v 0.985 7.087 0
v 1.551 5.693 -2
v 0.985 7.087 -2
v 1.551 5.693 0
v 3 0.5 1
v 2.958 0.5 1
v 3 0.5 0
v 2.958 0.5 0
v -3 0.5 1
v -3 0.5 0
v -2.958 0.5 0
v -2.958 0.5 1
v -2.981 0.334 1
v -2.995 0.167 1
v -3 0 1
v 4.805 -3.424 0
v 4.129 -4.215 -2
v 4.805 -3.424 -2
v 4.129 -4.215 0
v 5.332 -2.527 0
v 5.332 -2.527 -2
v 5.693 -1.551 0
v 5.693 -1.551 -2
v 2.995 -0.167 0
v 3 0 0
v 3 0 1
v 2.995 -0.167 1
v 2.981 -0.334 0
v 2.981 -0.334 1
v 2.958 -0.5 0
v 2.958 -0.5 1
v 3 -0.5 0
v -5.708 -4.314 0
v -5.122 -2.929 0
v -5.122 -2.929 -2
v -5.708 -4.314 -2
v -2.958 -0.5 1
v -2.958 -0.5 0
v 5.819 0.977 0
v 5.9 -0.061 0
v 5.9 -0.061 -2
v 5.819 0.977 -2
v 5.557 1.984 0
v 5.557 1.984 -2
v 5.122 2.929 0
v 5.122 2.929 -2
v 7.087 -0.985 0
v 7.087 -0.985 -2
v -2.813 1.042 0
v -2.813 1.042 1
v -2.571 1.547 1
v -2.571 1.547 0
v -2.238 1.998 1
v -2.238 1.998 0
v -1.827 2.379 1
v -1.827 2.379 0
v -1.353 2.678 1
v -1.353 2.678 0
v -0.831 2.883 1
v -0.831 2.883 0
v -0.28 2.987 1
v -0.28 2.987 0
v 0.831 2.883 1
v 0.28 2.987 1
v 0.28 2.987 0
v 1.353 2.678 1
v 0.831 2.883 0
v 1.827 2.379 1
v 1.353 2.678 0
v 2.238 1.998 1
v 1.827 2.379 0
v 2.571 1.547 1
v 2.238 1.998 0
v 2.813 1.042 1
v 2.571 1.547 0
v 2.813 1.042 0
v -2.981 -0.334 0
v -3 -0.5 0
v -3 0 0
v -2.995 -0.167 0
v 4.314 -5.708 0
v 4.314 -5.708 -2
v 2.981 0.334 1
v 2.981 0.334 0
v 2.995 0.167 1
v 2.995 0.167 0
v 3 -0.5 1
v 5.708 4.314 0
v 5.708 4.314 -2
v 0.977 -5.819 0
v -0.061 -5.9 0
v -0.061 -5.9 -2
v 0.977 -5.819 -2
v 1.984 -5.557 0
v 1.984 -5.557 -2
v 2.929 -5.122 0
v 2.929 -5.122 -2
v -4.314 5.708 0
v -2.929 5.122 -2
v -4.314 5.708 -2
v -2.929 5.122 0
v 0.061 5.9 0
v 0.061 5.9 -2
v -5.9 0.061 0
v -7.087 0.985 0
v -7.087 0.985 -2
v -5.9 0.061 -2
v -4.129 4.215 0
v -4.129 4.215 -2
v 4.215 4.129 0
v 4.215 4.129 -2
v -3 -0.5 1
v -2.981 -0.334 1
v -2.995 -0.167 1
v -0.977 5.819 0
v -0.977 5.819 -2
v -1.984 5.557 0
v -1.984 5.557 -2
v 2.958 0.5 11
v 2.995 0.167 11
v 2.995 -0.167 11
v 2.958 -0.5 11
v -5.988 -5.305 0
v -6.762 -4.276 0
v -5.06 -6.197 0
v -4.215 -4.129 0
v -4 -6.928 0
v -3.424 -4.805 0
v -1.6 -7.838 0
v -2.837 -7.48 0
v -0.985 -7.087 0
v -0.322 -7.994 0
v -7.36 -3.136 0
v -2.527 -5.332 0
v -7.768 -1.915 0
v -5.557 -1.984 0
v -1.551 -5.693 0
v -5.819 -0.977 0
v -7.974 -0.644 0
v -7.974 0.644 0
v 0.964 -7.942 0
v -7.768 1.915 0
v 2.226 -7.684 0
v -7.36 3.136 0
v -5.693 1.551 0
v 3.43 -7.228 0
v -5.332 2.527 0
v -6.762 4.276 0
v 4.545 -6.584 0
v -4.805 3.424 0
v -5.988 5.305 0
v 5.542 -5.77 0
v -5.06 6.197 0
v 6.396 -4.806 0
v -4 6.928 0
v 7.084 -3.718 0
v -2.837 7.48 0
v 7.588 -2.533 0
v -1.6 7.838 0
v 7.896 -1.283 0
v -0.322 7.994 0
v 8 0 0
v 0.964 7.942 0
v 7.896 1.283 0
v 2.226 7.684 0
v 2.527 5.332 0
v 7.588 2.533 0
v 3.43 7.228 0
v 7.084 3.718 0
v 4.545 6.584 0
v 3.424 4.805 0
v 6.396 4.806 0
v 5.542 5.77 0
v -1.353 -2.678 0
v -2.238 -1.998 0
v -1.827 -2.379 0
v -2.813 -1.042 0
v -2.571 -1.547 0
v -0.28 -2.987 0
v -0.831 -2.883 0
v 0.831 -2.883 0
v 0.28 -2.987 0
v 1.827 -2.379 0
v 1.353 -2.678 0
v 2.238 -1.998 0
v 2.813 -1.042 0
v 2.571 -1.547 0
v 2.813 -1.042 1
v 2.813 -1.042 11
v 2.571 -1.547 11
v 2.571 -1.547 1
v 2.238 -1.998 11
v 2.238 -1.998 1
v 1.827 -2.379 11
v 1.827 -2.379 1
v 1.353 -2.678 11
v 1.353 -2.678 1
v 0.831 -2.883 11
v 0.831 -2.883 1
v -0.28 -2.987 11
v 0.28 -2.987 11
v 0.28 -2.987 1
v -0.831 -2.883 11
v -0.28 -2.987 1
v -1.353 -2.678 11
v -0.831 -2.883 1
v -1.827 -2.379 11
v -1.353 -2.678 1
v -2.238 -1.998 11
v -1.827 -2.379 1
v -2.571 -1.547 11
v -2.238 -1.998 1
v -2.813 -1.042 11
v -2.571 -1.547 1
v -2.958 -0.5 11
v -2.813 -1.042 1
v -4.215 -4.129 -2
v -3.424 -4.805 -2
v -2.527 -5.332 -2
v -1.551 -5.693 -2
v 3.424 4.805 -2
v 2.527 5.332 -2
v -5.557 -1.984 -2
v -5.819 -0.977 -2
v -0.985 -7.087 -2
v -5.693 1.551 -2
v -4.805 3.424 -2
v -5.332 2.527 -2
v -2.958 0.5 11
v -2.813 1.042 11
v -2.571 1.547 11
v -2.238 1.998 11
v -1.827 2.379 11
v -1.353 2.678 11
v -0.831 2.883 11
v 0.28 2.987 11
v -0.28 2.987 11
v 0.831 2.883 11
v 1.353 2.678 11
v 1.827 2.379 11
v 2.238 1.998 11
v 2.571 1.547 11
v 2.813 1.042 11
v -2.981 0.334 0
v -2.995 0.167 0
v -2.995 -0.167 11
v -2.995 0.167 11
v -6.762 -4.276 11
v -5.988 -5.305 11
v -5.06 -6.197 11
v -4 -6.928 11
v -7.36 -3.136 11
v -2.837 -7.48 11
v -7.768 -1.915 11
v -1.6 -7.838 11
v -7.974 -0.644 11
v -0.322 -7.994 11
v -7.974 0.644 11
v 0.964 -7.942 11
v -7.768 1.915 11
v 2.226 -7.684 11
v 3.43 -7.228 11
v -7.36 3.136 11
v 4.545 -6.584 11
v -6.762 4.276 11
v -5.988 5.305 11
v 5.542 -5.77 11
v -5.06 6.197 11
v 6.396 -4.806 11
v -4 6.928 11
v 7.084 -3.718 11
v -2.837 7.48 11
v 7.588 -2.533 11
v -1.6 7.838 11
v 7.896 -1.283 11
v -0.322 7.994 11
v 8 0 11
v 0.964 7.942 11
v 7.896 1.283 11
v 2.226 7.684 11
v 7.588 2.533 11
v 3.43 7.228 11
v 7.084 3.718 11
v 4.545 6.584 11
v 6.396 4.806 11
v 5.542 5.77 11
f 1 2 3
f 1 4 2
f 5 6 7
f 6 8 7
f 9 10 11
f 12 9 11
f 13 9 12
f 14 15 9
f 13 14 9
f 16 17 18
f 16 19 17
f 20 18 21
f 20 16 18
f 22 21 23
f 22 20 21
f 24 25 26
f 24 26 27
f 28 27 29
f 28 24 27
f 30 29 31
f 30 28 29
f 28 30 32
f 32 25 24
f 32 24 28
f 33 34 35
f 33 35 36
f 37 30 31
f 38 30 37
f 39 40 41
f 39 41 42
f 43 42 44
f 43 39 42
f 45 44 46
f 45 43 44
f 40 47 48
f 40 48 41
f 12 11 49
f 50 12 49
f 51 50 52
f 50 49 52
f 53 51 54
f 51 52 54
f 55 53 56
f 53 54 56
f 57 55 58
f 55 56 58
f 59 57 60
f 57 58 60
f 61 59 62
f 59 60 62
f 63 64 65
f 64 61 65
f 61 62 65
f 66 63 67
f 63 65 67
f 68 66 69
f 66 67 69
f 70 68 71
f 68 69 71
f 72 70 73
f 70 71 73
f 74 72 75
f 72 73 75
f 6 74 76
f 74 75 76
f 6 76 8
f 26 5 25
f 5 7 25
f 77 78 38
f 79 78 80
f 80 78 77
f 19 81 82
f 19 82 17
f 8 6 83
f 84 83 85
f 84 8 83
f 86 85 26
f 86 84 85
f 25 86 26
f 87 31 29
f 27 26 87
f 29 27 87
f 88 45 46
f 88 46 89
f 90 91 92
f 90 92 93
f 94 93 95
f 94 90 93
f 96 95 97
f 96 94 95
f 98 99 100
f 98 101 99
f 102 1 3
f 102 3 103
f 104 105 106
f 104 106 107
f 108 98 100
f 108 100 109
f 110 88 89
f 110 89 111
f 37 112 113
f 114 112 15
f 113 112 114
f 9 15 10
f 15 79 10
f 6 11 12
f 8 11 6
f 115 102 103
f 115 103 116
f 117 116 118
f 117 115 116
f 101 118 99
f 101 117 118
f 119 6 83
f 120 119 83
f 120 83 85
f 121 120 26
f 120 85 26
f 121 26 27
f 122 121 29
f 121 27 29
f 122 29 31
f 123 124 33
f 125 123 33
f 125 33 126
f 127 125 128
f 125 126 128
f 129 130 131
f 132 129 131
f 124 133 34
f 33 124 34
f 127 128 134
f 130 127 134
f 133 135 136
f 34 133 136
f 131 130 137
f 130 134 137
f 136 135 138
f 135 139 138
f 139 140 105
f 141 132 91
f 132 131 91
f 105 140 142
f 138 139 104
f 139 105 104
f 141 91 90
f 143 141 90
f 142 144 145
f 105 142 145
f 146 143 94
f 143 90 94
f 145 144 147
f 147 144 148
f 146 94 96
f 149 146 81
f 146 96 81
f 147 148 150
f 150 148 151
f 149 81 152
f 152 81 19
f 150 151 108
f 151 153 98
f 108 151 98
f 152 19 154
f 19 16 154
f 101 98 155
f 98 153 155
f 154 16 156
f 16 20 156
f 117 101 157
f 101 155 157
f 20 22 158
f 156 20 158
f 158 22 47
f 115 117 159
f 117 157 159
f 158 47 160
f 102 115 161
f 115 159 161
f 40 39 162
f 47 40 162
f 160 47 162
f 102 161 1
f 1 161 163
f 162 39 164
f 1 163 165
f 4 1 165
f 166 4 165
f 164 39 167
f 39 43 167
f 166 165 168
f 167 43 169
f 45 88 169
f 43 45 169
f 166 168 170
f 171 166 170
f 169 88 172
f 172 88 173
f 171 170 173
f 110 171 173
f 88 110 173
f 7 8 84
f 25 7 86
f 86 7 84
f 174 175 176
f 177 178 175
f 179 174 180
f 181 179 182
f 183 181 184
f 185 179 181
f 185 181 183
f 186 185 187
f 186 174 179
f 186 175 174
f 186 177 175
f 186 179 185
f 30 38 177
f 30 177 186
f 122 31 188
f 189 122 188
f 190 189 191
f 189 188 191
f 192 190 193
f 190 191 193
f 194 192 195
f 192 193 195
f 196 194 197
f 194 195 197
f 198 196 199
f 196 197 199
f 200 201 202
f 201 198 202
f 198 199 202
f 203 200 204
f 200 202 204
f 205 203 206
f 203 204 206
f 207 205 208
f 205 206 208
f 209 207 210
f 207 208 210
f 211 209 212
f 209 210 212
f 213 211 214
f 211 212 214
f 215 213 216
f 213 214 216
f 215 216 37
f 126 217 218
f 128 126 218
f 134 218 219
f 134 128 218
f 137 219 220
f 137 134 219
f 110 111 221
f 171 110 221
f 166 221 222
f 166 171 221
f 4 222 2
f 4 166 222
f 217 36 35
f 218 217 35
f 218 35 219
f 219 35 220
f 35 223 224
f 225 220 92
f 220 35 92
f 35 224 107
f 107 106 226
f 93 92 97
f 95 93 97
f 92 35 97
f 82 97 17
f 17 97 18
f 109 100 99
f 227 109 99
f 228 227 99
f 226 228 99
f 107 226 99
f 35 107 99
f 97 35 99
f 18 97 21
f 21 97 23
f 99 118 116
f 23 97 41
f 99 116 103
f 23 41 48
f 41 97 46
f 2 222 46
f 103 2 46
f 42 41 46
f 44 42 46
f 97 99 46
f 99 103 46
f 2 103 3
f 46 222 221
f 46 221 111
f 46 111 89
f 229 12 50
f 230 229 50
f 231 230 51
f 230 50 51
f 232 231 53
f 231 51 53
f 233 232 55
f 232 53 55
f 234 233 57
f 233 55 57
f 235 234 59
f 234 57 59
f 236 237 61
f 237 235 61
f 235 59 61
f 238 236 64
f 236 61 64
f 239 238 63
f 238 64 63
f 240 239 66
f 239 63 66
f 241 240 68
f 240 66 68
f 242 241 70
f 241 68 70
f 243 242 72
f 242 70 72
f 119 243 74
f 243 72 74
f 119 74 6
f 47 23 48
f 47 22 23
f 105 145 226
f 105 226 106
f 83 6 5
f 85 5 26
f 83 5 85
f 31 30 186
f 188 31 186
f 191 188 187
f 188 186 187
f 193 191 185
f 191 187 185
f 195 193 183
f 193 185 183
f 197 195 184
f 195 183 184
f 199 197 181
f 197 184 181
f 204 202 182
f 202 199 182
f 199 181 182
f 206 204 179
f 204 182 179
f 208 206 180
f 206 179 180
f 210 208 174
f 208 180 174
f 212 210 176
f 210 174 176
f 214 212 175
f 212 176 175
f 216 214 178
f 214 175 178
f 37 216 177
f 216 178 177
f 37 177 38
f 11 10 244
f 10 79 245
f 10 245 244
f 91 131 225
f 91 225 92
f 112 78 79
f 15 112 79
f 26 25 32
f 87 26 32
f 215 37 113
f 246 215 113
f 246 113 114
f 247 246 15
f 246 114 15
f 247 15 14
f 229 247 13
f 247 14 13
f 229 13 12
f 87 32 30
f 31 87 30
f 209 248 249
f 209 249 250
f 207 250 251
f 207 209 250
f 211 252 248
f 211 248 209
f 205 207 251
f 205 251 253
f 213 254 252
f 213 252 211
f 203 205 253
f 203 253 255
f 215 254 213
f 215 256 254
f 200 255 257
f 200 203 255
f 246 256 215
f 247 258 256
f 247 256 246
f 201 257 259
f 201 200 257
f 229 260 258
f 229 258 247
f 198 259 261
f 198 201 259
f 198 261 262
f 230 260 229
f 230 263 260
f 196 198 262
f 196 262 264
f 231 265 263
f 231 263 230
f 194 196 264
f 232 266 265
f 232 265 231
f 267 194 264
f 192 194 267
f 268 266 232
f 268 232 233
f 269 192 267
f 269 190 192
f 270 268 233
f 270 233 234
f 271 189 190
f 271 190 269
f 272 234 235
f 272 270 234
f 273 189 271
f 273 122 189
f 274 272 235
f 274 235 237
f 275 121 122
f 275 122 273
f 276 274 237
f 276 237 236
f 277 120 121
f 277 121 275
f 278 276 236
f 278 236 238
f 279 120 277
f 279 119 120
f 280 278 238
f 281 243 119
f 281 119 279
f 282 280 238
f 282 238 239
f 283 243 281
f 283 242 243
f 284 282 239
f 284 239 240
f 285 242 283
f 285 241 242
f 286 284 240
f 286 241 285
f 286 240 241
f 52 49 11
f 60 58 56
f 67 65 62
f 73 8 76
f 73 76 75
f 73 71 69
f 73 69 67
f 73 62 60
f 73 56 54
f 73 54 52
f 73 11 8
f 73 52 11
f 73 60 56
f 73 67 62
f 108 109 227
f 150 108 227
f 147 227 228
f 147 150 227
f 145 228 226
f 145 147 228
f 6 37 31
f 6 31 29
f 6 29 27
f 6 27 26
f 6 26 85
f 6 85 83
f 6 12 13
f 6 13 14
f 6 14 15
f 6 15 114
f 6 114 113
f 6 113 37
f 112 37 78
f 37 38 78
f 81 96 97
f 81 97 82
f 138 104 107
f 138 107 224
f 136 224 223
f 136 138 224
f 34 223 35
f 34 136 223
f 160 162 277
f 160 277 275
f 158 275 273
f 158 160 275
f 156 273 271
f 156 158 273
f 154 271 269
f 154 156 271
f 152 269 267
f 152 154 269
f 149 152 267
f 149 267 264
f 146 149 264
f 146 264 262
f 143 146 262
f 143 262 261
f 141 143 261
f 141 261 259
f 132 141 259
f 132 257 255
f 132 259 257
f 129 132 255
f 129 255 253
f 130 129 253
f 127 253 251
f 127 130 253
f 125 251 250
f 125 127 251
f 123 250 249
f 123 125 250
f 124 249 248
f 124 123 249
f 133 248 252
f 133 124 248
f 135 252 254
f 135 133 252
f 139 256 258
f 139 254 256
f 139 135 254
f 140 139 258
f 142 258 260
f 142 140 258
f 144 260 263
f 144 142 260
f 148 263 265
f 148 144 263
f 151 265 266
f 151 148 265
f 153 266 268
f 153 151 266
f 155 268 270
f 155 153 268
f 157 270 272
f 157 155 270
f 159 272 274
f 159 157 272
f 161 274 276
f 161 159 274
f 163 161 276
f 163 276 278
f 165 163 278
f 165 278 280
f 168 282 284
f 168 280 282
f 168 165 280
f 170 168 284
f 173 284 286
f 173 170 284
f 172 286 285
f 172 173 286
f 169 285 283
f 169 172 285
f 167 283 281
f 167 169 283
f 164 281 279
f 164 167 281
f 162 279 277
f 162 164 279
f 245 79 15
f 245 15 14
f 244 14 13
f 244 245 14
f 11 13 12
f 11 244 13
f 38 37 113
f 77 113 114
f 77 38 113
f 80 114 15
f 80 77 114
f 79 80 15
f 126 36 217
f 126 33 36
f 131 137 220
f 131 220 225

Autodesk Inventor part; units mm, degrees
ref_plane "YZ Plane" through (0, 0, 0) normal (1, 0, 0) x (0, 1, 0)
ref_plane "XZ Plane" through (0, 0, 0) normal (0, 1, 0) x (-1, 0, 0)
ref_plane "XY Plane" through (0, 0, 0) normal (0, 0, 1) x (1, 0, 0)
sketch "Sketch1" plane through (0, 0, 0) normal (0, 0, 1) x (1, 0, 0)
  circle A0 centre (0, 0) radius 8 projected
  circle A1 centre (0, 0) radius 8 projected
  arc A2 (-4.1289, 4.2146) -> (-5.6926, 1.5507) centre (0, 0) ccw projected
  line L0 (-5.6926, 1.5507) -> (-7.0866, 0.985) projected
  line L1 (-7.0866, 0.985) -> (-5.8997, 0.0606) projected
  arc A3 (-5.8997, 0.0606) -> (-5.1217, -2.9288) centre (0, 0) ccw projected
  line L2 (-5.1217, -2.9288) -> (-5.7075, -4.3145) projected
  line L3 (-5.7075, -4.3145) -> (-4.2146, -4.1289) projected
  arc A4 (-4.2146, -4.1289) -> (-1.5507, -5.6926) centre (0, 0) ccw projected
  line L4 (-1.5507, -5.6926) -> (-0.985, -7.0866) projected
  line L5 (-0.985, -7.0866) -> (-0.0606, -5.8997) projected
  arc A5 (-0.0606, -5.8997) -> (2.9288, -5.1217) centre (0, 0) ccw projected
  line L6 (2.9288, -5.1217) -> (4.3145, -5.7075) projected
  line L7 (4.3145, -5.7075) -> (4.1289, -4.2146) projected
  arc A6 (4.1289, -4.2146) -> (5.6926, -1.5507) centre (0, 0) ccw projected
  line L8 (5.6926, -1.5507) -> (7.0866, -0.985) projected
  line L9 (7.0866, -0.985) -> (5.8997, -0.0606) projected
  arc A7 (5.8997, -0.0606) -> (5.1217, 2.9288) centre (0, 0) ccw projected
  line L10 (5.1217, 2.9288) -> (5.7075, 4.3145) projected
  line L11 (5.7075, 4.3145) -> (4.2146, 4.1289) projected
  arc A8 (4.2146, 4.1289) -> (1.5507, 5.6926) centre (0, 0) ccw projected
  line L12 (1.5507, 5.6926) -> (0.985, 7.0866) projected
  line L13 (0.985, 7.0866) -> (0.0606, 5.8997) projected
  arc A9 (0.0606, 5.8997) -> (-2.9288, 5.1217) centre (0, 0) ccw projected
  line L14 (-2.9288, 5.1217) -> (-4.3145, 5.7075) projected
  line L15 (-4.3145, 5.7075) -> (-4.1289, 4.2146) projected
  line L16 (7.2864, -1.0128) -> (5.7765, -1.6254) projected
  arc A10 (4.2351, -4.2514) -> (5.7765, -1.6254) centre (0, 0) ccw projected
  line L17 (4.2351, -4.2514) -> (4.4361, -5.8684) projected
  line L18 (4.4361, -5.8684) -> (2.9353, -5.234) projected
  arc A11 (-0.0115, -6.0008) -> (2.9353, -5.234) centre (0, 0) ccw projected
  line L19 (-0.0115, -6.0008) -> (-1.0128, -7.2864) projected
  line L20 (-1.0128, -7.2864) -> (-1.6254, -5.7765) projected
  arc A12 (-4.2514, -4.2351) -> (-1.6254, -5.7765) centre (0, 0) ccw projected
  line L21 (-4.2514, -4.2351) -> (-5.8684, -4.4361) projected
  line L22 (-5.8684, -4.4361) -> (-5.234, -2.9353) projected
  arc A13 (-6.0008, 0.0115) -> (-5.234, -2.9353) centre (0, 0) ccw projected
  line L23 (-6.0008, 0.0115) -> (-7.2864, 1.0128) projected
  line L24 (-7.2864, 1.0128) -> (-5.7765, 1.6254) projected
  arc A14 (-4.2351, 4.2514) -> (-5.7765, 1.6254) centre (0, 0) ccw projected
  line L25 (-4.2351, 4.2514) -> (-4.4361, 5.8684) projected
  line L26 (-4.4361, 5.8684) -> (-2.9353, 5.234) projected
  arc A15 (0.0115, 6.0008) -> (-2.9353, 5.234) centre (0, 0) ccw projected
  line L27 (0.0115, 6.0008) -> (1.0128, 7.2864) projected
  line L28 (1.0128, 7.2864) -> (1.6254, 5.7765) projected
  arc A16 (4.2514, 4.2351) -> (1.6254, 5.7765) centre (0, 0) ccw projected
  line L29 (4.2514, 4.2351) -> (5.8684, 4.4361) projected
  line L30 (5.8684, 4.4361) -> (5.234, 2.9353) projected
  arc A17 (6.0008, -0.0115) -> (5.234, 2.9353) centre (0, 0) ccw projected
  line L31 (6.0008, -0.0115) -> (7.2864, -1.0128) projected
  point P0 (0, 0)
extrude "Extrusion1" add sketch "Sketch1" against normal blind 2 contours L15 L14 A9 L13 L12 A8 L11 L10 A7 L9 L8 A6 L7 L6 A5 L5 L4 A4 L3 L2 A3 L1 L0 A2
sketch "Sketch2" plane through (0, 0, 0) normal (0, 0, 1) x (1, 0, 0)
  line L0 (7.2864, -1.0128) -> (5.7765, -1.6254) projected
  arc A0 (4.2351, -4.2514) -> (5.7765, -1.6254) centre (0, 0) ccw projected
  line L1 (4.2351, -4.2514) -> (4.4361, -5.8684) projected
  line L2 (4.4361, -5.8684) -> (2.9353, -5.234) projected
  arc A1 (-0.0115, -6.0008) -> (2.9353, -5.234) centre (0, 0) ccw projected
  line L3 (-0.0115, -6.0008) -> (-1.0128, -7.2864) projected
  line L4 (-1.0128, -7.2864) -> (-1.6254, -5.7765) projected
  arc A2 (-4.2514, -4.2351) -> (-1.6254, -5.7765) centre (0, 0) ccw projected
  line L5 (-4.2514, -4.2351) -> (-5.8684, -4.4361) projected
  line L6 (-5.8684, -4.4361) -> (-5.234, -2.9353) projected
  arc A3 (-6.0008, 0.0115) -> (-5.234, -2.9353) centre (0, 0) ccw projected
  line L7 (-6.0008, 0.0115) -> (-7.2864, 1.0128) projected
  line L8 (-7.2864, 1.0128) -> (-5.7765, 1.6254) projected
  arc A4 (-4.2351, 4.2514) -> (-5.7765, 1.6254) centre (0, 0) ccw projected
  line L9 (-4.2351, 4.2514) -> (-4.4361, 5.8684) projected
  line L10 (-4.4361, 5.8684) -> (-2.9353, 5.234) projected
  arc A5 (0.0115, 6.0008) -> (-2.9353, 5.234) centre (0, 0) ccw projected
  line L11 (0.0115, 6.0008) -> (1.0128, 7.2864) projected
  line L12 (1.0128, 7.2864) -> (1.6254, 5.7765) projected
  arc A6 (4.2514, 4.2351) -> (1.6254, 5.7765) centre (0, 0) ccw projected
  line L13 (4.2514, 4.2351) -> (5.8684, 4.4361) projected
  line L14 (5.8684, 4.4361) -> (5.234, 2.9353) projected
  arc A7 (6.0008, -0.0115) -> (5.234, 2.9353) centre (0, 0) ccw projected
  line L15 (6.0008, -0.0115) -> (7.2864, -1.0128) projected
  circle A8 centre (0, 0) radius 8 projected
  circle A9 centre (0, 0) radius 3
  line L16 (-3, 0.5) -> (3, 0.5)
  line L17 (3, 0.5) -> (3, -0.5)
  line L18 (3, -0.5) -> (-3, -0.5)
  line L19 (-3, -0.5) -> (-3, 0.5)
  line L20 (-3, 0.5) -> (3, -0.5) construction
  line L21 (3, 0.5) -> (-3, -0.5) construction
  point P0 (0, 0)
  point P1 (-3, 0)
  point P2 (-2.958, 0.5)
  point P3 (2.958, 0.5)
  point P4 (3, 0)
  point P5 (2.958, -0.5)
  point P6 (-2.958, -0.5)
  dimension "d2" = 6
  dimension "d3" = 6
  dimension "d4" = 1
extrude "Extrusion2" add sketch "Sketch2" along normal blind 1 contours L0 A0 L1 L2 A1 L3 L4 A2 L5 L6 A3 L7 L8 A4 L9 L10 A5 L11 L12 A6 L13 L14 A7 L15 | A8 | A9 L18 L16
sketch "Sketch3" plane through (0, 0, 1) normal (0, 0, 1) x (1, 0, 0)
  circle A0 centre (0, 0) radius 8 projected
  arc A1 (-2.958, -0.5) -> (2.958, -0.5) centre (0, 0) ccw projected
  line L0 (-2.958, -0.5) -> (2.958, -0.5) projected
  line L1 (2.958, 0.5) -> (-2.958, 0.5) projected
  arc A2 (2.958, 0.5) -> (-2.958, 0.5) centre (0, 0) ccw projected
  circle A3 centre (0, 0) radius 3
  point P0 (0, 0)
  point P1 (-2.958, -0.5)
  point P2 (2.958, -0.5)
extrude "Extrusion3" add sketch "Sketch3" along normal blind 10
properties part number "handle_base_potholder"
